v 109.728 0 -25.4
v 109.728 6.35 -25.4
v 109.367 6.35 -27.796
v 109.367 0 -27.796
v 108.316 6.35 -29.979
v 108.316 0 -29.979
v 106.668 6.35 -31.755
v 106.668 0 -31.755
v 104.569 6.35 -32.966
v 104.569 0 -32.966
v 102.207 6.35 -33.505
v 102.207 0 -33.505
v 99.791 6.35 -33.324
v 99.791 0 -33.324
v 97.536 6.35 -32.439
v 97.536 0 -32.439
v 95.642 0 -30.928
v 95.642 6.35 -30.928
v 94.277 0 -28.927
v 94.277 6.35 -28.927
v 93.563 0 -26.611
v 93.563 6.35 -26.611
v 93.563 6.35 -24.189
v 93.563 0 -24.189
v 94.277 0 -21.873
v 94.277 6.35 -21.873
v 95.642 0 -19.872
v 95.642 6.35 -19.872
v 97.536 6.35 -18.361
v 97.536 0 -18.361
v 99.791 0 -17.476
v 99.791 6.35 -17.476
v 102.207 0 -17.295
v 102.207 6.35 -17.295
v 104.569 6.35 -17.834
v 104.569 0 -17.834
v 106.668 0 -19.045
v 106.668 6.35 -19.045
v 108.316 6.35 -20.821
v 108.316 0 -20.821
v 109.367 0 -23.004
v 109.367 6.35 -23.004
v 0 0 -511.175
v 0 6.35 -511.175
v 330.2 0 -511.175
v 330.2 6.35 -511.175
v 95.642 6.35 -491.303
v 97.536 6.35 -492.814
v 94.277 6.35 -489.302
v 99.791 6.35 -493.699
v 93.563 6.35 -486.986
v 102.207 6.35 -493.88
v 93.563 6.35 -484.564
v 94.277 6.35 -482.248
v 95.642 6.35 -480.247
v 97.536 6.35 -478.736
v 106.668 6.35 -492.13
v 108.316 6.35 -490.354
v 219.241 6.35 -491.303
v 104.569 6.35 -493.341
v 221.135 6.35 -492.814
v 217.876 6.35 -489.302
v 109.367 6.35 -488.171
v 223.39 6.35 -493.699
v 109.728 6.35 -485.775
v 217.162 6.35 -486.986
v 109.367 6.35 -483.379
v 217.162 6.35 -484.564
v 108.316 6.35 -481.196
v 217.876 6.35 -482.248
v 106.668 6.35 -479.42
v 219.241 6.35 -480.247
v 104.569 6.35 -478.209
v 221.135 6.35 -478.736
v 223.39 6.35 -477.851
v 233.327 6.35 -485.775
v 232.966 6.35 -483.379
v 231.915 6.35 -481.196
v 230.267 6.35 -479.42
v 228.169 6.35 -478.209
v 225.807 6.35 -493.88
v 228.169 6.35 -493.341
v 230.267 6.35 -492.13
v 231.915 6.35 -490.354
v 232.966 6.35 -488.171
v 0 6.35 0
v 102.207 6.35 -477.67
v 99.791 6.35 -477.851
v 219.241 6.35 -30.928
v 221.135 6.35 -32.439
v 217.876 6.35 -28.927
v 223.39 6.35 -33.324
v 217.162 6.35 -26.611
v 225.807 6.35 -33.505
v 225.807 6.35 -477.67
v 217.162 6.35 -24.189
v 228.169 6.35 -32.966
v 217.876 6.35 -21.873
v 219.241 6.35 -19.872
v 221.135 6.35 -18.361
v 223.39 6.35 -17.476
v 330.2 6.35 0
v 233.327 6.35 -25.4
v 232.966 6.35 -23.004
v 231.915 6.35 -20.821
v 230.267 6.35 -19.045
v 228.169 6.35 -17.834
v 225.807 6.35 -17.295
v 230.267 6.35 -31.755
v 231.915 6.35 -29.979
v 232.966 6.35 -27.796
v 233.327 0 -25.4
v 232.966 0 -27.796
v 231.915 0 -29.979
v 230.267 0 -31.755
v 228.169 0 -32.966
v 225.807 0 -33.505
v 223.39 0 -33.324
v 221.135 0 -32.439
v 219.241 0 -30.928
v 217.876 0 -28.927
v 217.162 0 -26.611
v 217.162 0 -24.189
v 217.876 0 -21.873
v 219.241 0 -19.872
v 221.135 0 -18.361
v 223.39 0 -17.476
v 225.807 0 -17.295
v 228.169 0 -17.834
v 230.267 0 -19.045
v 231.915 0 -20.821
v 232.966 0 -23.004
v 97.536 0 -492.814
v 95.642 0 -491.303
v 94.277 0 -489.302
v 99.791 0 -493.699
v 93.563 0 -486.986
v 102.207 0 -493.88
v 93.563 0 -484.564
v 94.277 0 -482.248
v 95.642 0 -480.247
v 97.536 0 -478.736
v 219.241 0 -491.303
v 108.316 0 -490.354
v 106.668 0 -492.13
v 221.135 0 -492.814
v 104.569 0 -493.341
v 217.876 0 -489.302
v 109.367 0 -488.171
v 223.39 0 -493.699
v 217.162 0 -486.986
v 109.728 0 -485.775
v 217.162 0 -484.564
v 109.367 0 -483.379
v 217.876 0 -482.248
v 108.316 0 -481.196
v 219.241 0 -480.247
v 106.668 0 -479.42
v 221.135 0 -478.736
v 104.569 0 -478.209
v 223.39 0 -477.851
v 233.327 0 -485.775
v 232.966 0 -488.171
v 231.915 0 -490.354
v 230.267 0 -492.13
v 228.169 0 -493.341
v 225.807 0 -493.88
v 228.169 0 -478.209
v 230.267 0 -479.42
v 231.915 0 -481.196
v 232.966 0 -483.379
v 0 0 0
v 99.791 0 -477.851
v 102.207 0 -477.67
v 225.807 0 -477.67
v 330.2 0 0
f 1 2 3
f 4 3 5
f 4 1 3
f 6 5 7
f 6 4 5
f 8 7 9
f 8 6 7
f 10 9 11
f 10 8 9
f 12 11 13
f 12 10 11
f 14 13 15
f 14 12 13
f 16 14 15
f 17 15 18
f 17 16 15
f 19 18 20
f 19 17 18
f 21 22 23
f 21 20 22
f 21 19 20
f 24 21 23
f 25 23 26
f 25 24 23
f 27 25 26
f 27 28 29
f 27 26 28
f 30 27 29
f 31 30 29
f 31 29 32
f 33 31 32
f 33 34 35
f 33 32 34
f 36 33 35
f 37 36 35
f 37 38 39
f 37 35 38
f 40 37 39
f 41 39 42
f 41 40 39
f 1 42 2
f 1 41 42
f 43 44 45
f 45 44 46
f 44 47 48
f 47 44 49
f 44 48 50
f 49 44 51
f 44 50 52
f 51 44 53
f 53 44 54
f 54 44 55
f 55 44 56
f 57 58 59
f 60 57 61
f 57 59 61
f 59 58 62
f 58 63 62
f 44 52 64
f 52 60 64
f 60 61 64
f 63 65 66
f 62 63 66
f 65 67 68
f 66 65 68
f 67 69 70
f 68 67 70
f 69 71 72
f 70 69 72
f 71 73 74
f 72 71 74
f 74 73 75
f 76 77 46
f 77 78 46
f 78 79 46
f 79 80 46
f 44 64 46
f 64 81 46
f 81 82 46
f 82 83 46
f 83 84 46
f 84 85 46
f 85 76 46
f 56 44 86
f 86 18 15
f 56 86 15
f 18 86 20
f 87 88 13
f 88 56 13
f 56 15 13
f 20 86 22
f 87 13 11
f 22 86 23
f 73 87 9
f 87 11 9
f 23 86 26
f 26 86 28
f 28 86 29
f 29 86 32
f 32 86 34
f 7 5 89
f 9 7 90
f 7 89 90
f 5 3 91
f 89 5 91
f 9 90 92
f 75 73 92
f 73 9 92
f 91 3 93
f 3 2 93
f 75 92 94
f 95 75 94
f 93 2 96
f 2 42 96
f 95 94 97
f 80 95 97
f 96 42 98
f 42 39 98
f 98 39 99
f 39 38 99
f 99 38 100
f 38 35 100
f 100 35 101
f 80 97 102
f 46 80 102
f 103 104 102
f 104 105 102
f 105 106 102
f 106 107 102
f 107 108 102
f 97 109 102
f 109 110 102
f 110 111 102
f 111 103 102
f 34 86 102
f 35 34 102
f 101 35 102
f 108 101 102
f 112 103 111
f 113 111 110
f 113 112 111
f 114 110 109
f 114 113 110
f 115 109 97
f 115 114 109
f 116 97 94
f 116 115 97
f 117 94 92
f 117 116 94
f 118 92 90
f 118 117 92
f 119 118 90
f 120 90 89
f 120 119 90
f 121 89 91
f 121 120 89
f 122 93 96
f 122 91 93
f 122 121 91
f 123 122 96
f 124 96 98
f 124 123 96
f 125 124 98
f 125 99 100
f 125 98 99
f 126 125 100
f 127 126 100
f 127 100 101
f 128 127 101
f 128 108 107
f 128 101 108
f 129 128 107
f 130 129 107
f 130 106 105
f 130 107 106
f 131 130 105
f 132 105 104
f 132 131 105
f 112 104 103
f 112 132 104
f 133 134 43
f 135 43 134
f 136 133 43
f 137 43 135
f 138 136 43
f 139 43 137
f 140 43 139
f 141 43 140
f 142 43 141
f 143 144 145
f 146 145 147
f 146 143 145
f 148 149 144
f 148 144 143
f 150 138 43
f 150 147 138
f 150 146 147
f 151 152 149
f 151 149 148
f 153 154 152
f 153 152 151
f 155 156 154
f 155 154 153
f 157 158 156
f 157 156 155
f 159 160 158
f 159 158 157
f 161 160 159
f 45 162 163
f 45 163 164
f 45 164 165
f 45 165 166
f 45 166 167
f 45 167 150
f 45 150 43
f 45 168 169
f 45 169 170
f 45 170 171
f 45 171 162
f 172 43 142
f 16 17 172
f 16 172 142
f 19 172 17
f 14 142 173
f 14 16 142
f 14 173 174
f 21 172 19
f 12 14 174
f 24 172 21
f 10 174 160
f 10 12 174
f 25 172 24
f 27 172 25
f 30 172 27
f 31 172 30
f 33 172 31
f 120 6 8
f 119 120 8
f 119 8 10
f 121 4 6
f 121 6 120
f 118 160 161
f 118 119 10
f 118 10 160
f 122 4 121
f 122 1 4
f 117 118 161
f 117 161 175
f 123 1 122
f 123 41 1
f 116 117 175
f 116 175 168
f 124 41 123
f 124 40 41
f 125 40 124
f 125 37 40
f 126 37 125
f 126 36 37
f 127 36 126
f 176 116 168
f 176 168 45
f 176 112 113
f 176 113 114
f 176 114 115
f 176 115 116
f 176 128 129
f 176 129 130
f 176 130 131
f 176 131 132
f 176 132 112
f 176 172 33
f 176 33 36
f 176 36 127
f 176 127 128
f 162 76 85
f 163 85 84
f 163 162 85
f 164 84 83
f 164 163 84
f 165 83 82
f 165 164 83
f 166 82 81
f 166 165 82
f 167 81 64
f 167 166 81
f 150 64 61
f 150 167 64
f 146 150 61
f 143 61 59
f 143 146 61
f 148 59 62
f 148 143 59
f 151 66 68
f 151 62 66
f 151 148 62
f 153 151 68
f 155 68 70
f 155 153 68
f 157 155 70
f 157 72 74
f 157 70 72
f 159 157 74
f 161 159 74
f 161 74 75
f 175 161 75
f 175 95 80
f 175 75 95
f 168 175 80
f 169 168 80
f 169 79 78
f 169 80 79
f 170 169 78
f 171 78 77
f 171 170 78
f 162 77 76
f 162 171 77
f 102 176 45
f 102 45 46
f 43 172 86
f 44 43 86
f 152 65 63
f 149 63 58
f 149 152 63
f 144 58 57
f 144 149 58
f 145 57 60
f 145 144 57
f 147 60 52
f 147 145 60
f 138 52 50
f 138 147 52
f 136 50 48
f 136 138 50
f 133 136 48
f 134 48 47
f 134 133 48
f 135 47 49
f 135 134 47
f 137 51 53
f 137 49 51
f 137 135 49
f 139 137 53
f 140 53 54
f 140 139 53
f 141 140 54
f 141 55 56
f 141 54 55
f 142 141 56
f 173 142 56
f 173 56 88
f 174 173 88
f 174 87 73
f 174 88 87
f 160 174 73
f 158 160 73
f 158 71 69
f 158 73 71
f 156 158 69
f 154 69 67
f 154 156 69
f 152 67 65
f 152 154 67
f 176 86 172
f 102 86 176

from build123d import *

# Parameters (mm, degrees)
SKETCH3_W           = 330.2
SKETCH3_H           = 6.35
BOSS_EXTRUDE1_DEPTH = 511.175
SKETCH4_R           = 8.128
CUT_EXTRUDE1_DEPTH  = 7.35


with BuildPart() as part:
    # Sketch3 → Boss-Extrude1 (new body)
    with BuildSketch(Plane.XY):
        with Locations((165.1, 3.175)):
            Rectangle(SKETCH3_W, SKETCH3_H)
    extrude(amount=-BOSS_EXTRUDE1_DEPTH)

    # Sketch4 → Cut-Extrude1 (cut, through all)
    with BuildSketch(Plane(origin=(0, 0, 0), x_dir=(1, 0, 0), z_dir=(0, 1, 0))):
        with Locations((101.6, 25.4)):
            Circle(SKETCH4_R)
        with Locations((225.199138423, 25.4)):
            Circle(SKETCH4_R)
        with Locations((225.199138423, 485.775)):
            Circle(SKETCH4_R)
        with Locations((101.6, 485.775)):
            Circle(SKETCH4_R)
    extrude(amount=CUT_EXTRUDE1_DEPTH, mode=Mode.SUBTRACT)


solid = part.part
